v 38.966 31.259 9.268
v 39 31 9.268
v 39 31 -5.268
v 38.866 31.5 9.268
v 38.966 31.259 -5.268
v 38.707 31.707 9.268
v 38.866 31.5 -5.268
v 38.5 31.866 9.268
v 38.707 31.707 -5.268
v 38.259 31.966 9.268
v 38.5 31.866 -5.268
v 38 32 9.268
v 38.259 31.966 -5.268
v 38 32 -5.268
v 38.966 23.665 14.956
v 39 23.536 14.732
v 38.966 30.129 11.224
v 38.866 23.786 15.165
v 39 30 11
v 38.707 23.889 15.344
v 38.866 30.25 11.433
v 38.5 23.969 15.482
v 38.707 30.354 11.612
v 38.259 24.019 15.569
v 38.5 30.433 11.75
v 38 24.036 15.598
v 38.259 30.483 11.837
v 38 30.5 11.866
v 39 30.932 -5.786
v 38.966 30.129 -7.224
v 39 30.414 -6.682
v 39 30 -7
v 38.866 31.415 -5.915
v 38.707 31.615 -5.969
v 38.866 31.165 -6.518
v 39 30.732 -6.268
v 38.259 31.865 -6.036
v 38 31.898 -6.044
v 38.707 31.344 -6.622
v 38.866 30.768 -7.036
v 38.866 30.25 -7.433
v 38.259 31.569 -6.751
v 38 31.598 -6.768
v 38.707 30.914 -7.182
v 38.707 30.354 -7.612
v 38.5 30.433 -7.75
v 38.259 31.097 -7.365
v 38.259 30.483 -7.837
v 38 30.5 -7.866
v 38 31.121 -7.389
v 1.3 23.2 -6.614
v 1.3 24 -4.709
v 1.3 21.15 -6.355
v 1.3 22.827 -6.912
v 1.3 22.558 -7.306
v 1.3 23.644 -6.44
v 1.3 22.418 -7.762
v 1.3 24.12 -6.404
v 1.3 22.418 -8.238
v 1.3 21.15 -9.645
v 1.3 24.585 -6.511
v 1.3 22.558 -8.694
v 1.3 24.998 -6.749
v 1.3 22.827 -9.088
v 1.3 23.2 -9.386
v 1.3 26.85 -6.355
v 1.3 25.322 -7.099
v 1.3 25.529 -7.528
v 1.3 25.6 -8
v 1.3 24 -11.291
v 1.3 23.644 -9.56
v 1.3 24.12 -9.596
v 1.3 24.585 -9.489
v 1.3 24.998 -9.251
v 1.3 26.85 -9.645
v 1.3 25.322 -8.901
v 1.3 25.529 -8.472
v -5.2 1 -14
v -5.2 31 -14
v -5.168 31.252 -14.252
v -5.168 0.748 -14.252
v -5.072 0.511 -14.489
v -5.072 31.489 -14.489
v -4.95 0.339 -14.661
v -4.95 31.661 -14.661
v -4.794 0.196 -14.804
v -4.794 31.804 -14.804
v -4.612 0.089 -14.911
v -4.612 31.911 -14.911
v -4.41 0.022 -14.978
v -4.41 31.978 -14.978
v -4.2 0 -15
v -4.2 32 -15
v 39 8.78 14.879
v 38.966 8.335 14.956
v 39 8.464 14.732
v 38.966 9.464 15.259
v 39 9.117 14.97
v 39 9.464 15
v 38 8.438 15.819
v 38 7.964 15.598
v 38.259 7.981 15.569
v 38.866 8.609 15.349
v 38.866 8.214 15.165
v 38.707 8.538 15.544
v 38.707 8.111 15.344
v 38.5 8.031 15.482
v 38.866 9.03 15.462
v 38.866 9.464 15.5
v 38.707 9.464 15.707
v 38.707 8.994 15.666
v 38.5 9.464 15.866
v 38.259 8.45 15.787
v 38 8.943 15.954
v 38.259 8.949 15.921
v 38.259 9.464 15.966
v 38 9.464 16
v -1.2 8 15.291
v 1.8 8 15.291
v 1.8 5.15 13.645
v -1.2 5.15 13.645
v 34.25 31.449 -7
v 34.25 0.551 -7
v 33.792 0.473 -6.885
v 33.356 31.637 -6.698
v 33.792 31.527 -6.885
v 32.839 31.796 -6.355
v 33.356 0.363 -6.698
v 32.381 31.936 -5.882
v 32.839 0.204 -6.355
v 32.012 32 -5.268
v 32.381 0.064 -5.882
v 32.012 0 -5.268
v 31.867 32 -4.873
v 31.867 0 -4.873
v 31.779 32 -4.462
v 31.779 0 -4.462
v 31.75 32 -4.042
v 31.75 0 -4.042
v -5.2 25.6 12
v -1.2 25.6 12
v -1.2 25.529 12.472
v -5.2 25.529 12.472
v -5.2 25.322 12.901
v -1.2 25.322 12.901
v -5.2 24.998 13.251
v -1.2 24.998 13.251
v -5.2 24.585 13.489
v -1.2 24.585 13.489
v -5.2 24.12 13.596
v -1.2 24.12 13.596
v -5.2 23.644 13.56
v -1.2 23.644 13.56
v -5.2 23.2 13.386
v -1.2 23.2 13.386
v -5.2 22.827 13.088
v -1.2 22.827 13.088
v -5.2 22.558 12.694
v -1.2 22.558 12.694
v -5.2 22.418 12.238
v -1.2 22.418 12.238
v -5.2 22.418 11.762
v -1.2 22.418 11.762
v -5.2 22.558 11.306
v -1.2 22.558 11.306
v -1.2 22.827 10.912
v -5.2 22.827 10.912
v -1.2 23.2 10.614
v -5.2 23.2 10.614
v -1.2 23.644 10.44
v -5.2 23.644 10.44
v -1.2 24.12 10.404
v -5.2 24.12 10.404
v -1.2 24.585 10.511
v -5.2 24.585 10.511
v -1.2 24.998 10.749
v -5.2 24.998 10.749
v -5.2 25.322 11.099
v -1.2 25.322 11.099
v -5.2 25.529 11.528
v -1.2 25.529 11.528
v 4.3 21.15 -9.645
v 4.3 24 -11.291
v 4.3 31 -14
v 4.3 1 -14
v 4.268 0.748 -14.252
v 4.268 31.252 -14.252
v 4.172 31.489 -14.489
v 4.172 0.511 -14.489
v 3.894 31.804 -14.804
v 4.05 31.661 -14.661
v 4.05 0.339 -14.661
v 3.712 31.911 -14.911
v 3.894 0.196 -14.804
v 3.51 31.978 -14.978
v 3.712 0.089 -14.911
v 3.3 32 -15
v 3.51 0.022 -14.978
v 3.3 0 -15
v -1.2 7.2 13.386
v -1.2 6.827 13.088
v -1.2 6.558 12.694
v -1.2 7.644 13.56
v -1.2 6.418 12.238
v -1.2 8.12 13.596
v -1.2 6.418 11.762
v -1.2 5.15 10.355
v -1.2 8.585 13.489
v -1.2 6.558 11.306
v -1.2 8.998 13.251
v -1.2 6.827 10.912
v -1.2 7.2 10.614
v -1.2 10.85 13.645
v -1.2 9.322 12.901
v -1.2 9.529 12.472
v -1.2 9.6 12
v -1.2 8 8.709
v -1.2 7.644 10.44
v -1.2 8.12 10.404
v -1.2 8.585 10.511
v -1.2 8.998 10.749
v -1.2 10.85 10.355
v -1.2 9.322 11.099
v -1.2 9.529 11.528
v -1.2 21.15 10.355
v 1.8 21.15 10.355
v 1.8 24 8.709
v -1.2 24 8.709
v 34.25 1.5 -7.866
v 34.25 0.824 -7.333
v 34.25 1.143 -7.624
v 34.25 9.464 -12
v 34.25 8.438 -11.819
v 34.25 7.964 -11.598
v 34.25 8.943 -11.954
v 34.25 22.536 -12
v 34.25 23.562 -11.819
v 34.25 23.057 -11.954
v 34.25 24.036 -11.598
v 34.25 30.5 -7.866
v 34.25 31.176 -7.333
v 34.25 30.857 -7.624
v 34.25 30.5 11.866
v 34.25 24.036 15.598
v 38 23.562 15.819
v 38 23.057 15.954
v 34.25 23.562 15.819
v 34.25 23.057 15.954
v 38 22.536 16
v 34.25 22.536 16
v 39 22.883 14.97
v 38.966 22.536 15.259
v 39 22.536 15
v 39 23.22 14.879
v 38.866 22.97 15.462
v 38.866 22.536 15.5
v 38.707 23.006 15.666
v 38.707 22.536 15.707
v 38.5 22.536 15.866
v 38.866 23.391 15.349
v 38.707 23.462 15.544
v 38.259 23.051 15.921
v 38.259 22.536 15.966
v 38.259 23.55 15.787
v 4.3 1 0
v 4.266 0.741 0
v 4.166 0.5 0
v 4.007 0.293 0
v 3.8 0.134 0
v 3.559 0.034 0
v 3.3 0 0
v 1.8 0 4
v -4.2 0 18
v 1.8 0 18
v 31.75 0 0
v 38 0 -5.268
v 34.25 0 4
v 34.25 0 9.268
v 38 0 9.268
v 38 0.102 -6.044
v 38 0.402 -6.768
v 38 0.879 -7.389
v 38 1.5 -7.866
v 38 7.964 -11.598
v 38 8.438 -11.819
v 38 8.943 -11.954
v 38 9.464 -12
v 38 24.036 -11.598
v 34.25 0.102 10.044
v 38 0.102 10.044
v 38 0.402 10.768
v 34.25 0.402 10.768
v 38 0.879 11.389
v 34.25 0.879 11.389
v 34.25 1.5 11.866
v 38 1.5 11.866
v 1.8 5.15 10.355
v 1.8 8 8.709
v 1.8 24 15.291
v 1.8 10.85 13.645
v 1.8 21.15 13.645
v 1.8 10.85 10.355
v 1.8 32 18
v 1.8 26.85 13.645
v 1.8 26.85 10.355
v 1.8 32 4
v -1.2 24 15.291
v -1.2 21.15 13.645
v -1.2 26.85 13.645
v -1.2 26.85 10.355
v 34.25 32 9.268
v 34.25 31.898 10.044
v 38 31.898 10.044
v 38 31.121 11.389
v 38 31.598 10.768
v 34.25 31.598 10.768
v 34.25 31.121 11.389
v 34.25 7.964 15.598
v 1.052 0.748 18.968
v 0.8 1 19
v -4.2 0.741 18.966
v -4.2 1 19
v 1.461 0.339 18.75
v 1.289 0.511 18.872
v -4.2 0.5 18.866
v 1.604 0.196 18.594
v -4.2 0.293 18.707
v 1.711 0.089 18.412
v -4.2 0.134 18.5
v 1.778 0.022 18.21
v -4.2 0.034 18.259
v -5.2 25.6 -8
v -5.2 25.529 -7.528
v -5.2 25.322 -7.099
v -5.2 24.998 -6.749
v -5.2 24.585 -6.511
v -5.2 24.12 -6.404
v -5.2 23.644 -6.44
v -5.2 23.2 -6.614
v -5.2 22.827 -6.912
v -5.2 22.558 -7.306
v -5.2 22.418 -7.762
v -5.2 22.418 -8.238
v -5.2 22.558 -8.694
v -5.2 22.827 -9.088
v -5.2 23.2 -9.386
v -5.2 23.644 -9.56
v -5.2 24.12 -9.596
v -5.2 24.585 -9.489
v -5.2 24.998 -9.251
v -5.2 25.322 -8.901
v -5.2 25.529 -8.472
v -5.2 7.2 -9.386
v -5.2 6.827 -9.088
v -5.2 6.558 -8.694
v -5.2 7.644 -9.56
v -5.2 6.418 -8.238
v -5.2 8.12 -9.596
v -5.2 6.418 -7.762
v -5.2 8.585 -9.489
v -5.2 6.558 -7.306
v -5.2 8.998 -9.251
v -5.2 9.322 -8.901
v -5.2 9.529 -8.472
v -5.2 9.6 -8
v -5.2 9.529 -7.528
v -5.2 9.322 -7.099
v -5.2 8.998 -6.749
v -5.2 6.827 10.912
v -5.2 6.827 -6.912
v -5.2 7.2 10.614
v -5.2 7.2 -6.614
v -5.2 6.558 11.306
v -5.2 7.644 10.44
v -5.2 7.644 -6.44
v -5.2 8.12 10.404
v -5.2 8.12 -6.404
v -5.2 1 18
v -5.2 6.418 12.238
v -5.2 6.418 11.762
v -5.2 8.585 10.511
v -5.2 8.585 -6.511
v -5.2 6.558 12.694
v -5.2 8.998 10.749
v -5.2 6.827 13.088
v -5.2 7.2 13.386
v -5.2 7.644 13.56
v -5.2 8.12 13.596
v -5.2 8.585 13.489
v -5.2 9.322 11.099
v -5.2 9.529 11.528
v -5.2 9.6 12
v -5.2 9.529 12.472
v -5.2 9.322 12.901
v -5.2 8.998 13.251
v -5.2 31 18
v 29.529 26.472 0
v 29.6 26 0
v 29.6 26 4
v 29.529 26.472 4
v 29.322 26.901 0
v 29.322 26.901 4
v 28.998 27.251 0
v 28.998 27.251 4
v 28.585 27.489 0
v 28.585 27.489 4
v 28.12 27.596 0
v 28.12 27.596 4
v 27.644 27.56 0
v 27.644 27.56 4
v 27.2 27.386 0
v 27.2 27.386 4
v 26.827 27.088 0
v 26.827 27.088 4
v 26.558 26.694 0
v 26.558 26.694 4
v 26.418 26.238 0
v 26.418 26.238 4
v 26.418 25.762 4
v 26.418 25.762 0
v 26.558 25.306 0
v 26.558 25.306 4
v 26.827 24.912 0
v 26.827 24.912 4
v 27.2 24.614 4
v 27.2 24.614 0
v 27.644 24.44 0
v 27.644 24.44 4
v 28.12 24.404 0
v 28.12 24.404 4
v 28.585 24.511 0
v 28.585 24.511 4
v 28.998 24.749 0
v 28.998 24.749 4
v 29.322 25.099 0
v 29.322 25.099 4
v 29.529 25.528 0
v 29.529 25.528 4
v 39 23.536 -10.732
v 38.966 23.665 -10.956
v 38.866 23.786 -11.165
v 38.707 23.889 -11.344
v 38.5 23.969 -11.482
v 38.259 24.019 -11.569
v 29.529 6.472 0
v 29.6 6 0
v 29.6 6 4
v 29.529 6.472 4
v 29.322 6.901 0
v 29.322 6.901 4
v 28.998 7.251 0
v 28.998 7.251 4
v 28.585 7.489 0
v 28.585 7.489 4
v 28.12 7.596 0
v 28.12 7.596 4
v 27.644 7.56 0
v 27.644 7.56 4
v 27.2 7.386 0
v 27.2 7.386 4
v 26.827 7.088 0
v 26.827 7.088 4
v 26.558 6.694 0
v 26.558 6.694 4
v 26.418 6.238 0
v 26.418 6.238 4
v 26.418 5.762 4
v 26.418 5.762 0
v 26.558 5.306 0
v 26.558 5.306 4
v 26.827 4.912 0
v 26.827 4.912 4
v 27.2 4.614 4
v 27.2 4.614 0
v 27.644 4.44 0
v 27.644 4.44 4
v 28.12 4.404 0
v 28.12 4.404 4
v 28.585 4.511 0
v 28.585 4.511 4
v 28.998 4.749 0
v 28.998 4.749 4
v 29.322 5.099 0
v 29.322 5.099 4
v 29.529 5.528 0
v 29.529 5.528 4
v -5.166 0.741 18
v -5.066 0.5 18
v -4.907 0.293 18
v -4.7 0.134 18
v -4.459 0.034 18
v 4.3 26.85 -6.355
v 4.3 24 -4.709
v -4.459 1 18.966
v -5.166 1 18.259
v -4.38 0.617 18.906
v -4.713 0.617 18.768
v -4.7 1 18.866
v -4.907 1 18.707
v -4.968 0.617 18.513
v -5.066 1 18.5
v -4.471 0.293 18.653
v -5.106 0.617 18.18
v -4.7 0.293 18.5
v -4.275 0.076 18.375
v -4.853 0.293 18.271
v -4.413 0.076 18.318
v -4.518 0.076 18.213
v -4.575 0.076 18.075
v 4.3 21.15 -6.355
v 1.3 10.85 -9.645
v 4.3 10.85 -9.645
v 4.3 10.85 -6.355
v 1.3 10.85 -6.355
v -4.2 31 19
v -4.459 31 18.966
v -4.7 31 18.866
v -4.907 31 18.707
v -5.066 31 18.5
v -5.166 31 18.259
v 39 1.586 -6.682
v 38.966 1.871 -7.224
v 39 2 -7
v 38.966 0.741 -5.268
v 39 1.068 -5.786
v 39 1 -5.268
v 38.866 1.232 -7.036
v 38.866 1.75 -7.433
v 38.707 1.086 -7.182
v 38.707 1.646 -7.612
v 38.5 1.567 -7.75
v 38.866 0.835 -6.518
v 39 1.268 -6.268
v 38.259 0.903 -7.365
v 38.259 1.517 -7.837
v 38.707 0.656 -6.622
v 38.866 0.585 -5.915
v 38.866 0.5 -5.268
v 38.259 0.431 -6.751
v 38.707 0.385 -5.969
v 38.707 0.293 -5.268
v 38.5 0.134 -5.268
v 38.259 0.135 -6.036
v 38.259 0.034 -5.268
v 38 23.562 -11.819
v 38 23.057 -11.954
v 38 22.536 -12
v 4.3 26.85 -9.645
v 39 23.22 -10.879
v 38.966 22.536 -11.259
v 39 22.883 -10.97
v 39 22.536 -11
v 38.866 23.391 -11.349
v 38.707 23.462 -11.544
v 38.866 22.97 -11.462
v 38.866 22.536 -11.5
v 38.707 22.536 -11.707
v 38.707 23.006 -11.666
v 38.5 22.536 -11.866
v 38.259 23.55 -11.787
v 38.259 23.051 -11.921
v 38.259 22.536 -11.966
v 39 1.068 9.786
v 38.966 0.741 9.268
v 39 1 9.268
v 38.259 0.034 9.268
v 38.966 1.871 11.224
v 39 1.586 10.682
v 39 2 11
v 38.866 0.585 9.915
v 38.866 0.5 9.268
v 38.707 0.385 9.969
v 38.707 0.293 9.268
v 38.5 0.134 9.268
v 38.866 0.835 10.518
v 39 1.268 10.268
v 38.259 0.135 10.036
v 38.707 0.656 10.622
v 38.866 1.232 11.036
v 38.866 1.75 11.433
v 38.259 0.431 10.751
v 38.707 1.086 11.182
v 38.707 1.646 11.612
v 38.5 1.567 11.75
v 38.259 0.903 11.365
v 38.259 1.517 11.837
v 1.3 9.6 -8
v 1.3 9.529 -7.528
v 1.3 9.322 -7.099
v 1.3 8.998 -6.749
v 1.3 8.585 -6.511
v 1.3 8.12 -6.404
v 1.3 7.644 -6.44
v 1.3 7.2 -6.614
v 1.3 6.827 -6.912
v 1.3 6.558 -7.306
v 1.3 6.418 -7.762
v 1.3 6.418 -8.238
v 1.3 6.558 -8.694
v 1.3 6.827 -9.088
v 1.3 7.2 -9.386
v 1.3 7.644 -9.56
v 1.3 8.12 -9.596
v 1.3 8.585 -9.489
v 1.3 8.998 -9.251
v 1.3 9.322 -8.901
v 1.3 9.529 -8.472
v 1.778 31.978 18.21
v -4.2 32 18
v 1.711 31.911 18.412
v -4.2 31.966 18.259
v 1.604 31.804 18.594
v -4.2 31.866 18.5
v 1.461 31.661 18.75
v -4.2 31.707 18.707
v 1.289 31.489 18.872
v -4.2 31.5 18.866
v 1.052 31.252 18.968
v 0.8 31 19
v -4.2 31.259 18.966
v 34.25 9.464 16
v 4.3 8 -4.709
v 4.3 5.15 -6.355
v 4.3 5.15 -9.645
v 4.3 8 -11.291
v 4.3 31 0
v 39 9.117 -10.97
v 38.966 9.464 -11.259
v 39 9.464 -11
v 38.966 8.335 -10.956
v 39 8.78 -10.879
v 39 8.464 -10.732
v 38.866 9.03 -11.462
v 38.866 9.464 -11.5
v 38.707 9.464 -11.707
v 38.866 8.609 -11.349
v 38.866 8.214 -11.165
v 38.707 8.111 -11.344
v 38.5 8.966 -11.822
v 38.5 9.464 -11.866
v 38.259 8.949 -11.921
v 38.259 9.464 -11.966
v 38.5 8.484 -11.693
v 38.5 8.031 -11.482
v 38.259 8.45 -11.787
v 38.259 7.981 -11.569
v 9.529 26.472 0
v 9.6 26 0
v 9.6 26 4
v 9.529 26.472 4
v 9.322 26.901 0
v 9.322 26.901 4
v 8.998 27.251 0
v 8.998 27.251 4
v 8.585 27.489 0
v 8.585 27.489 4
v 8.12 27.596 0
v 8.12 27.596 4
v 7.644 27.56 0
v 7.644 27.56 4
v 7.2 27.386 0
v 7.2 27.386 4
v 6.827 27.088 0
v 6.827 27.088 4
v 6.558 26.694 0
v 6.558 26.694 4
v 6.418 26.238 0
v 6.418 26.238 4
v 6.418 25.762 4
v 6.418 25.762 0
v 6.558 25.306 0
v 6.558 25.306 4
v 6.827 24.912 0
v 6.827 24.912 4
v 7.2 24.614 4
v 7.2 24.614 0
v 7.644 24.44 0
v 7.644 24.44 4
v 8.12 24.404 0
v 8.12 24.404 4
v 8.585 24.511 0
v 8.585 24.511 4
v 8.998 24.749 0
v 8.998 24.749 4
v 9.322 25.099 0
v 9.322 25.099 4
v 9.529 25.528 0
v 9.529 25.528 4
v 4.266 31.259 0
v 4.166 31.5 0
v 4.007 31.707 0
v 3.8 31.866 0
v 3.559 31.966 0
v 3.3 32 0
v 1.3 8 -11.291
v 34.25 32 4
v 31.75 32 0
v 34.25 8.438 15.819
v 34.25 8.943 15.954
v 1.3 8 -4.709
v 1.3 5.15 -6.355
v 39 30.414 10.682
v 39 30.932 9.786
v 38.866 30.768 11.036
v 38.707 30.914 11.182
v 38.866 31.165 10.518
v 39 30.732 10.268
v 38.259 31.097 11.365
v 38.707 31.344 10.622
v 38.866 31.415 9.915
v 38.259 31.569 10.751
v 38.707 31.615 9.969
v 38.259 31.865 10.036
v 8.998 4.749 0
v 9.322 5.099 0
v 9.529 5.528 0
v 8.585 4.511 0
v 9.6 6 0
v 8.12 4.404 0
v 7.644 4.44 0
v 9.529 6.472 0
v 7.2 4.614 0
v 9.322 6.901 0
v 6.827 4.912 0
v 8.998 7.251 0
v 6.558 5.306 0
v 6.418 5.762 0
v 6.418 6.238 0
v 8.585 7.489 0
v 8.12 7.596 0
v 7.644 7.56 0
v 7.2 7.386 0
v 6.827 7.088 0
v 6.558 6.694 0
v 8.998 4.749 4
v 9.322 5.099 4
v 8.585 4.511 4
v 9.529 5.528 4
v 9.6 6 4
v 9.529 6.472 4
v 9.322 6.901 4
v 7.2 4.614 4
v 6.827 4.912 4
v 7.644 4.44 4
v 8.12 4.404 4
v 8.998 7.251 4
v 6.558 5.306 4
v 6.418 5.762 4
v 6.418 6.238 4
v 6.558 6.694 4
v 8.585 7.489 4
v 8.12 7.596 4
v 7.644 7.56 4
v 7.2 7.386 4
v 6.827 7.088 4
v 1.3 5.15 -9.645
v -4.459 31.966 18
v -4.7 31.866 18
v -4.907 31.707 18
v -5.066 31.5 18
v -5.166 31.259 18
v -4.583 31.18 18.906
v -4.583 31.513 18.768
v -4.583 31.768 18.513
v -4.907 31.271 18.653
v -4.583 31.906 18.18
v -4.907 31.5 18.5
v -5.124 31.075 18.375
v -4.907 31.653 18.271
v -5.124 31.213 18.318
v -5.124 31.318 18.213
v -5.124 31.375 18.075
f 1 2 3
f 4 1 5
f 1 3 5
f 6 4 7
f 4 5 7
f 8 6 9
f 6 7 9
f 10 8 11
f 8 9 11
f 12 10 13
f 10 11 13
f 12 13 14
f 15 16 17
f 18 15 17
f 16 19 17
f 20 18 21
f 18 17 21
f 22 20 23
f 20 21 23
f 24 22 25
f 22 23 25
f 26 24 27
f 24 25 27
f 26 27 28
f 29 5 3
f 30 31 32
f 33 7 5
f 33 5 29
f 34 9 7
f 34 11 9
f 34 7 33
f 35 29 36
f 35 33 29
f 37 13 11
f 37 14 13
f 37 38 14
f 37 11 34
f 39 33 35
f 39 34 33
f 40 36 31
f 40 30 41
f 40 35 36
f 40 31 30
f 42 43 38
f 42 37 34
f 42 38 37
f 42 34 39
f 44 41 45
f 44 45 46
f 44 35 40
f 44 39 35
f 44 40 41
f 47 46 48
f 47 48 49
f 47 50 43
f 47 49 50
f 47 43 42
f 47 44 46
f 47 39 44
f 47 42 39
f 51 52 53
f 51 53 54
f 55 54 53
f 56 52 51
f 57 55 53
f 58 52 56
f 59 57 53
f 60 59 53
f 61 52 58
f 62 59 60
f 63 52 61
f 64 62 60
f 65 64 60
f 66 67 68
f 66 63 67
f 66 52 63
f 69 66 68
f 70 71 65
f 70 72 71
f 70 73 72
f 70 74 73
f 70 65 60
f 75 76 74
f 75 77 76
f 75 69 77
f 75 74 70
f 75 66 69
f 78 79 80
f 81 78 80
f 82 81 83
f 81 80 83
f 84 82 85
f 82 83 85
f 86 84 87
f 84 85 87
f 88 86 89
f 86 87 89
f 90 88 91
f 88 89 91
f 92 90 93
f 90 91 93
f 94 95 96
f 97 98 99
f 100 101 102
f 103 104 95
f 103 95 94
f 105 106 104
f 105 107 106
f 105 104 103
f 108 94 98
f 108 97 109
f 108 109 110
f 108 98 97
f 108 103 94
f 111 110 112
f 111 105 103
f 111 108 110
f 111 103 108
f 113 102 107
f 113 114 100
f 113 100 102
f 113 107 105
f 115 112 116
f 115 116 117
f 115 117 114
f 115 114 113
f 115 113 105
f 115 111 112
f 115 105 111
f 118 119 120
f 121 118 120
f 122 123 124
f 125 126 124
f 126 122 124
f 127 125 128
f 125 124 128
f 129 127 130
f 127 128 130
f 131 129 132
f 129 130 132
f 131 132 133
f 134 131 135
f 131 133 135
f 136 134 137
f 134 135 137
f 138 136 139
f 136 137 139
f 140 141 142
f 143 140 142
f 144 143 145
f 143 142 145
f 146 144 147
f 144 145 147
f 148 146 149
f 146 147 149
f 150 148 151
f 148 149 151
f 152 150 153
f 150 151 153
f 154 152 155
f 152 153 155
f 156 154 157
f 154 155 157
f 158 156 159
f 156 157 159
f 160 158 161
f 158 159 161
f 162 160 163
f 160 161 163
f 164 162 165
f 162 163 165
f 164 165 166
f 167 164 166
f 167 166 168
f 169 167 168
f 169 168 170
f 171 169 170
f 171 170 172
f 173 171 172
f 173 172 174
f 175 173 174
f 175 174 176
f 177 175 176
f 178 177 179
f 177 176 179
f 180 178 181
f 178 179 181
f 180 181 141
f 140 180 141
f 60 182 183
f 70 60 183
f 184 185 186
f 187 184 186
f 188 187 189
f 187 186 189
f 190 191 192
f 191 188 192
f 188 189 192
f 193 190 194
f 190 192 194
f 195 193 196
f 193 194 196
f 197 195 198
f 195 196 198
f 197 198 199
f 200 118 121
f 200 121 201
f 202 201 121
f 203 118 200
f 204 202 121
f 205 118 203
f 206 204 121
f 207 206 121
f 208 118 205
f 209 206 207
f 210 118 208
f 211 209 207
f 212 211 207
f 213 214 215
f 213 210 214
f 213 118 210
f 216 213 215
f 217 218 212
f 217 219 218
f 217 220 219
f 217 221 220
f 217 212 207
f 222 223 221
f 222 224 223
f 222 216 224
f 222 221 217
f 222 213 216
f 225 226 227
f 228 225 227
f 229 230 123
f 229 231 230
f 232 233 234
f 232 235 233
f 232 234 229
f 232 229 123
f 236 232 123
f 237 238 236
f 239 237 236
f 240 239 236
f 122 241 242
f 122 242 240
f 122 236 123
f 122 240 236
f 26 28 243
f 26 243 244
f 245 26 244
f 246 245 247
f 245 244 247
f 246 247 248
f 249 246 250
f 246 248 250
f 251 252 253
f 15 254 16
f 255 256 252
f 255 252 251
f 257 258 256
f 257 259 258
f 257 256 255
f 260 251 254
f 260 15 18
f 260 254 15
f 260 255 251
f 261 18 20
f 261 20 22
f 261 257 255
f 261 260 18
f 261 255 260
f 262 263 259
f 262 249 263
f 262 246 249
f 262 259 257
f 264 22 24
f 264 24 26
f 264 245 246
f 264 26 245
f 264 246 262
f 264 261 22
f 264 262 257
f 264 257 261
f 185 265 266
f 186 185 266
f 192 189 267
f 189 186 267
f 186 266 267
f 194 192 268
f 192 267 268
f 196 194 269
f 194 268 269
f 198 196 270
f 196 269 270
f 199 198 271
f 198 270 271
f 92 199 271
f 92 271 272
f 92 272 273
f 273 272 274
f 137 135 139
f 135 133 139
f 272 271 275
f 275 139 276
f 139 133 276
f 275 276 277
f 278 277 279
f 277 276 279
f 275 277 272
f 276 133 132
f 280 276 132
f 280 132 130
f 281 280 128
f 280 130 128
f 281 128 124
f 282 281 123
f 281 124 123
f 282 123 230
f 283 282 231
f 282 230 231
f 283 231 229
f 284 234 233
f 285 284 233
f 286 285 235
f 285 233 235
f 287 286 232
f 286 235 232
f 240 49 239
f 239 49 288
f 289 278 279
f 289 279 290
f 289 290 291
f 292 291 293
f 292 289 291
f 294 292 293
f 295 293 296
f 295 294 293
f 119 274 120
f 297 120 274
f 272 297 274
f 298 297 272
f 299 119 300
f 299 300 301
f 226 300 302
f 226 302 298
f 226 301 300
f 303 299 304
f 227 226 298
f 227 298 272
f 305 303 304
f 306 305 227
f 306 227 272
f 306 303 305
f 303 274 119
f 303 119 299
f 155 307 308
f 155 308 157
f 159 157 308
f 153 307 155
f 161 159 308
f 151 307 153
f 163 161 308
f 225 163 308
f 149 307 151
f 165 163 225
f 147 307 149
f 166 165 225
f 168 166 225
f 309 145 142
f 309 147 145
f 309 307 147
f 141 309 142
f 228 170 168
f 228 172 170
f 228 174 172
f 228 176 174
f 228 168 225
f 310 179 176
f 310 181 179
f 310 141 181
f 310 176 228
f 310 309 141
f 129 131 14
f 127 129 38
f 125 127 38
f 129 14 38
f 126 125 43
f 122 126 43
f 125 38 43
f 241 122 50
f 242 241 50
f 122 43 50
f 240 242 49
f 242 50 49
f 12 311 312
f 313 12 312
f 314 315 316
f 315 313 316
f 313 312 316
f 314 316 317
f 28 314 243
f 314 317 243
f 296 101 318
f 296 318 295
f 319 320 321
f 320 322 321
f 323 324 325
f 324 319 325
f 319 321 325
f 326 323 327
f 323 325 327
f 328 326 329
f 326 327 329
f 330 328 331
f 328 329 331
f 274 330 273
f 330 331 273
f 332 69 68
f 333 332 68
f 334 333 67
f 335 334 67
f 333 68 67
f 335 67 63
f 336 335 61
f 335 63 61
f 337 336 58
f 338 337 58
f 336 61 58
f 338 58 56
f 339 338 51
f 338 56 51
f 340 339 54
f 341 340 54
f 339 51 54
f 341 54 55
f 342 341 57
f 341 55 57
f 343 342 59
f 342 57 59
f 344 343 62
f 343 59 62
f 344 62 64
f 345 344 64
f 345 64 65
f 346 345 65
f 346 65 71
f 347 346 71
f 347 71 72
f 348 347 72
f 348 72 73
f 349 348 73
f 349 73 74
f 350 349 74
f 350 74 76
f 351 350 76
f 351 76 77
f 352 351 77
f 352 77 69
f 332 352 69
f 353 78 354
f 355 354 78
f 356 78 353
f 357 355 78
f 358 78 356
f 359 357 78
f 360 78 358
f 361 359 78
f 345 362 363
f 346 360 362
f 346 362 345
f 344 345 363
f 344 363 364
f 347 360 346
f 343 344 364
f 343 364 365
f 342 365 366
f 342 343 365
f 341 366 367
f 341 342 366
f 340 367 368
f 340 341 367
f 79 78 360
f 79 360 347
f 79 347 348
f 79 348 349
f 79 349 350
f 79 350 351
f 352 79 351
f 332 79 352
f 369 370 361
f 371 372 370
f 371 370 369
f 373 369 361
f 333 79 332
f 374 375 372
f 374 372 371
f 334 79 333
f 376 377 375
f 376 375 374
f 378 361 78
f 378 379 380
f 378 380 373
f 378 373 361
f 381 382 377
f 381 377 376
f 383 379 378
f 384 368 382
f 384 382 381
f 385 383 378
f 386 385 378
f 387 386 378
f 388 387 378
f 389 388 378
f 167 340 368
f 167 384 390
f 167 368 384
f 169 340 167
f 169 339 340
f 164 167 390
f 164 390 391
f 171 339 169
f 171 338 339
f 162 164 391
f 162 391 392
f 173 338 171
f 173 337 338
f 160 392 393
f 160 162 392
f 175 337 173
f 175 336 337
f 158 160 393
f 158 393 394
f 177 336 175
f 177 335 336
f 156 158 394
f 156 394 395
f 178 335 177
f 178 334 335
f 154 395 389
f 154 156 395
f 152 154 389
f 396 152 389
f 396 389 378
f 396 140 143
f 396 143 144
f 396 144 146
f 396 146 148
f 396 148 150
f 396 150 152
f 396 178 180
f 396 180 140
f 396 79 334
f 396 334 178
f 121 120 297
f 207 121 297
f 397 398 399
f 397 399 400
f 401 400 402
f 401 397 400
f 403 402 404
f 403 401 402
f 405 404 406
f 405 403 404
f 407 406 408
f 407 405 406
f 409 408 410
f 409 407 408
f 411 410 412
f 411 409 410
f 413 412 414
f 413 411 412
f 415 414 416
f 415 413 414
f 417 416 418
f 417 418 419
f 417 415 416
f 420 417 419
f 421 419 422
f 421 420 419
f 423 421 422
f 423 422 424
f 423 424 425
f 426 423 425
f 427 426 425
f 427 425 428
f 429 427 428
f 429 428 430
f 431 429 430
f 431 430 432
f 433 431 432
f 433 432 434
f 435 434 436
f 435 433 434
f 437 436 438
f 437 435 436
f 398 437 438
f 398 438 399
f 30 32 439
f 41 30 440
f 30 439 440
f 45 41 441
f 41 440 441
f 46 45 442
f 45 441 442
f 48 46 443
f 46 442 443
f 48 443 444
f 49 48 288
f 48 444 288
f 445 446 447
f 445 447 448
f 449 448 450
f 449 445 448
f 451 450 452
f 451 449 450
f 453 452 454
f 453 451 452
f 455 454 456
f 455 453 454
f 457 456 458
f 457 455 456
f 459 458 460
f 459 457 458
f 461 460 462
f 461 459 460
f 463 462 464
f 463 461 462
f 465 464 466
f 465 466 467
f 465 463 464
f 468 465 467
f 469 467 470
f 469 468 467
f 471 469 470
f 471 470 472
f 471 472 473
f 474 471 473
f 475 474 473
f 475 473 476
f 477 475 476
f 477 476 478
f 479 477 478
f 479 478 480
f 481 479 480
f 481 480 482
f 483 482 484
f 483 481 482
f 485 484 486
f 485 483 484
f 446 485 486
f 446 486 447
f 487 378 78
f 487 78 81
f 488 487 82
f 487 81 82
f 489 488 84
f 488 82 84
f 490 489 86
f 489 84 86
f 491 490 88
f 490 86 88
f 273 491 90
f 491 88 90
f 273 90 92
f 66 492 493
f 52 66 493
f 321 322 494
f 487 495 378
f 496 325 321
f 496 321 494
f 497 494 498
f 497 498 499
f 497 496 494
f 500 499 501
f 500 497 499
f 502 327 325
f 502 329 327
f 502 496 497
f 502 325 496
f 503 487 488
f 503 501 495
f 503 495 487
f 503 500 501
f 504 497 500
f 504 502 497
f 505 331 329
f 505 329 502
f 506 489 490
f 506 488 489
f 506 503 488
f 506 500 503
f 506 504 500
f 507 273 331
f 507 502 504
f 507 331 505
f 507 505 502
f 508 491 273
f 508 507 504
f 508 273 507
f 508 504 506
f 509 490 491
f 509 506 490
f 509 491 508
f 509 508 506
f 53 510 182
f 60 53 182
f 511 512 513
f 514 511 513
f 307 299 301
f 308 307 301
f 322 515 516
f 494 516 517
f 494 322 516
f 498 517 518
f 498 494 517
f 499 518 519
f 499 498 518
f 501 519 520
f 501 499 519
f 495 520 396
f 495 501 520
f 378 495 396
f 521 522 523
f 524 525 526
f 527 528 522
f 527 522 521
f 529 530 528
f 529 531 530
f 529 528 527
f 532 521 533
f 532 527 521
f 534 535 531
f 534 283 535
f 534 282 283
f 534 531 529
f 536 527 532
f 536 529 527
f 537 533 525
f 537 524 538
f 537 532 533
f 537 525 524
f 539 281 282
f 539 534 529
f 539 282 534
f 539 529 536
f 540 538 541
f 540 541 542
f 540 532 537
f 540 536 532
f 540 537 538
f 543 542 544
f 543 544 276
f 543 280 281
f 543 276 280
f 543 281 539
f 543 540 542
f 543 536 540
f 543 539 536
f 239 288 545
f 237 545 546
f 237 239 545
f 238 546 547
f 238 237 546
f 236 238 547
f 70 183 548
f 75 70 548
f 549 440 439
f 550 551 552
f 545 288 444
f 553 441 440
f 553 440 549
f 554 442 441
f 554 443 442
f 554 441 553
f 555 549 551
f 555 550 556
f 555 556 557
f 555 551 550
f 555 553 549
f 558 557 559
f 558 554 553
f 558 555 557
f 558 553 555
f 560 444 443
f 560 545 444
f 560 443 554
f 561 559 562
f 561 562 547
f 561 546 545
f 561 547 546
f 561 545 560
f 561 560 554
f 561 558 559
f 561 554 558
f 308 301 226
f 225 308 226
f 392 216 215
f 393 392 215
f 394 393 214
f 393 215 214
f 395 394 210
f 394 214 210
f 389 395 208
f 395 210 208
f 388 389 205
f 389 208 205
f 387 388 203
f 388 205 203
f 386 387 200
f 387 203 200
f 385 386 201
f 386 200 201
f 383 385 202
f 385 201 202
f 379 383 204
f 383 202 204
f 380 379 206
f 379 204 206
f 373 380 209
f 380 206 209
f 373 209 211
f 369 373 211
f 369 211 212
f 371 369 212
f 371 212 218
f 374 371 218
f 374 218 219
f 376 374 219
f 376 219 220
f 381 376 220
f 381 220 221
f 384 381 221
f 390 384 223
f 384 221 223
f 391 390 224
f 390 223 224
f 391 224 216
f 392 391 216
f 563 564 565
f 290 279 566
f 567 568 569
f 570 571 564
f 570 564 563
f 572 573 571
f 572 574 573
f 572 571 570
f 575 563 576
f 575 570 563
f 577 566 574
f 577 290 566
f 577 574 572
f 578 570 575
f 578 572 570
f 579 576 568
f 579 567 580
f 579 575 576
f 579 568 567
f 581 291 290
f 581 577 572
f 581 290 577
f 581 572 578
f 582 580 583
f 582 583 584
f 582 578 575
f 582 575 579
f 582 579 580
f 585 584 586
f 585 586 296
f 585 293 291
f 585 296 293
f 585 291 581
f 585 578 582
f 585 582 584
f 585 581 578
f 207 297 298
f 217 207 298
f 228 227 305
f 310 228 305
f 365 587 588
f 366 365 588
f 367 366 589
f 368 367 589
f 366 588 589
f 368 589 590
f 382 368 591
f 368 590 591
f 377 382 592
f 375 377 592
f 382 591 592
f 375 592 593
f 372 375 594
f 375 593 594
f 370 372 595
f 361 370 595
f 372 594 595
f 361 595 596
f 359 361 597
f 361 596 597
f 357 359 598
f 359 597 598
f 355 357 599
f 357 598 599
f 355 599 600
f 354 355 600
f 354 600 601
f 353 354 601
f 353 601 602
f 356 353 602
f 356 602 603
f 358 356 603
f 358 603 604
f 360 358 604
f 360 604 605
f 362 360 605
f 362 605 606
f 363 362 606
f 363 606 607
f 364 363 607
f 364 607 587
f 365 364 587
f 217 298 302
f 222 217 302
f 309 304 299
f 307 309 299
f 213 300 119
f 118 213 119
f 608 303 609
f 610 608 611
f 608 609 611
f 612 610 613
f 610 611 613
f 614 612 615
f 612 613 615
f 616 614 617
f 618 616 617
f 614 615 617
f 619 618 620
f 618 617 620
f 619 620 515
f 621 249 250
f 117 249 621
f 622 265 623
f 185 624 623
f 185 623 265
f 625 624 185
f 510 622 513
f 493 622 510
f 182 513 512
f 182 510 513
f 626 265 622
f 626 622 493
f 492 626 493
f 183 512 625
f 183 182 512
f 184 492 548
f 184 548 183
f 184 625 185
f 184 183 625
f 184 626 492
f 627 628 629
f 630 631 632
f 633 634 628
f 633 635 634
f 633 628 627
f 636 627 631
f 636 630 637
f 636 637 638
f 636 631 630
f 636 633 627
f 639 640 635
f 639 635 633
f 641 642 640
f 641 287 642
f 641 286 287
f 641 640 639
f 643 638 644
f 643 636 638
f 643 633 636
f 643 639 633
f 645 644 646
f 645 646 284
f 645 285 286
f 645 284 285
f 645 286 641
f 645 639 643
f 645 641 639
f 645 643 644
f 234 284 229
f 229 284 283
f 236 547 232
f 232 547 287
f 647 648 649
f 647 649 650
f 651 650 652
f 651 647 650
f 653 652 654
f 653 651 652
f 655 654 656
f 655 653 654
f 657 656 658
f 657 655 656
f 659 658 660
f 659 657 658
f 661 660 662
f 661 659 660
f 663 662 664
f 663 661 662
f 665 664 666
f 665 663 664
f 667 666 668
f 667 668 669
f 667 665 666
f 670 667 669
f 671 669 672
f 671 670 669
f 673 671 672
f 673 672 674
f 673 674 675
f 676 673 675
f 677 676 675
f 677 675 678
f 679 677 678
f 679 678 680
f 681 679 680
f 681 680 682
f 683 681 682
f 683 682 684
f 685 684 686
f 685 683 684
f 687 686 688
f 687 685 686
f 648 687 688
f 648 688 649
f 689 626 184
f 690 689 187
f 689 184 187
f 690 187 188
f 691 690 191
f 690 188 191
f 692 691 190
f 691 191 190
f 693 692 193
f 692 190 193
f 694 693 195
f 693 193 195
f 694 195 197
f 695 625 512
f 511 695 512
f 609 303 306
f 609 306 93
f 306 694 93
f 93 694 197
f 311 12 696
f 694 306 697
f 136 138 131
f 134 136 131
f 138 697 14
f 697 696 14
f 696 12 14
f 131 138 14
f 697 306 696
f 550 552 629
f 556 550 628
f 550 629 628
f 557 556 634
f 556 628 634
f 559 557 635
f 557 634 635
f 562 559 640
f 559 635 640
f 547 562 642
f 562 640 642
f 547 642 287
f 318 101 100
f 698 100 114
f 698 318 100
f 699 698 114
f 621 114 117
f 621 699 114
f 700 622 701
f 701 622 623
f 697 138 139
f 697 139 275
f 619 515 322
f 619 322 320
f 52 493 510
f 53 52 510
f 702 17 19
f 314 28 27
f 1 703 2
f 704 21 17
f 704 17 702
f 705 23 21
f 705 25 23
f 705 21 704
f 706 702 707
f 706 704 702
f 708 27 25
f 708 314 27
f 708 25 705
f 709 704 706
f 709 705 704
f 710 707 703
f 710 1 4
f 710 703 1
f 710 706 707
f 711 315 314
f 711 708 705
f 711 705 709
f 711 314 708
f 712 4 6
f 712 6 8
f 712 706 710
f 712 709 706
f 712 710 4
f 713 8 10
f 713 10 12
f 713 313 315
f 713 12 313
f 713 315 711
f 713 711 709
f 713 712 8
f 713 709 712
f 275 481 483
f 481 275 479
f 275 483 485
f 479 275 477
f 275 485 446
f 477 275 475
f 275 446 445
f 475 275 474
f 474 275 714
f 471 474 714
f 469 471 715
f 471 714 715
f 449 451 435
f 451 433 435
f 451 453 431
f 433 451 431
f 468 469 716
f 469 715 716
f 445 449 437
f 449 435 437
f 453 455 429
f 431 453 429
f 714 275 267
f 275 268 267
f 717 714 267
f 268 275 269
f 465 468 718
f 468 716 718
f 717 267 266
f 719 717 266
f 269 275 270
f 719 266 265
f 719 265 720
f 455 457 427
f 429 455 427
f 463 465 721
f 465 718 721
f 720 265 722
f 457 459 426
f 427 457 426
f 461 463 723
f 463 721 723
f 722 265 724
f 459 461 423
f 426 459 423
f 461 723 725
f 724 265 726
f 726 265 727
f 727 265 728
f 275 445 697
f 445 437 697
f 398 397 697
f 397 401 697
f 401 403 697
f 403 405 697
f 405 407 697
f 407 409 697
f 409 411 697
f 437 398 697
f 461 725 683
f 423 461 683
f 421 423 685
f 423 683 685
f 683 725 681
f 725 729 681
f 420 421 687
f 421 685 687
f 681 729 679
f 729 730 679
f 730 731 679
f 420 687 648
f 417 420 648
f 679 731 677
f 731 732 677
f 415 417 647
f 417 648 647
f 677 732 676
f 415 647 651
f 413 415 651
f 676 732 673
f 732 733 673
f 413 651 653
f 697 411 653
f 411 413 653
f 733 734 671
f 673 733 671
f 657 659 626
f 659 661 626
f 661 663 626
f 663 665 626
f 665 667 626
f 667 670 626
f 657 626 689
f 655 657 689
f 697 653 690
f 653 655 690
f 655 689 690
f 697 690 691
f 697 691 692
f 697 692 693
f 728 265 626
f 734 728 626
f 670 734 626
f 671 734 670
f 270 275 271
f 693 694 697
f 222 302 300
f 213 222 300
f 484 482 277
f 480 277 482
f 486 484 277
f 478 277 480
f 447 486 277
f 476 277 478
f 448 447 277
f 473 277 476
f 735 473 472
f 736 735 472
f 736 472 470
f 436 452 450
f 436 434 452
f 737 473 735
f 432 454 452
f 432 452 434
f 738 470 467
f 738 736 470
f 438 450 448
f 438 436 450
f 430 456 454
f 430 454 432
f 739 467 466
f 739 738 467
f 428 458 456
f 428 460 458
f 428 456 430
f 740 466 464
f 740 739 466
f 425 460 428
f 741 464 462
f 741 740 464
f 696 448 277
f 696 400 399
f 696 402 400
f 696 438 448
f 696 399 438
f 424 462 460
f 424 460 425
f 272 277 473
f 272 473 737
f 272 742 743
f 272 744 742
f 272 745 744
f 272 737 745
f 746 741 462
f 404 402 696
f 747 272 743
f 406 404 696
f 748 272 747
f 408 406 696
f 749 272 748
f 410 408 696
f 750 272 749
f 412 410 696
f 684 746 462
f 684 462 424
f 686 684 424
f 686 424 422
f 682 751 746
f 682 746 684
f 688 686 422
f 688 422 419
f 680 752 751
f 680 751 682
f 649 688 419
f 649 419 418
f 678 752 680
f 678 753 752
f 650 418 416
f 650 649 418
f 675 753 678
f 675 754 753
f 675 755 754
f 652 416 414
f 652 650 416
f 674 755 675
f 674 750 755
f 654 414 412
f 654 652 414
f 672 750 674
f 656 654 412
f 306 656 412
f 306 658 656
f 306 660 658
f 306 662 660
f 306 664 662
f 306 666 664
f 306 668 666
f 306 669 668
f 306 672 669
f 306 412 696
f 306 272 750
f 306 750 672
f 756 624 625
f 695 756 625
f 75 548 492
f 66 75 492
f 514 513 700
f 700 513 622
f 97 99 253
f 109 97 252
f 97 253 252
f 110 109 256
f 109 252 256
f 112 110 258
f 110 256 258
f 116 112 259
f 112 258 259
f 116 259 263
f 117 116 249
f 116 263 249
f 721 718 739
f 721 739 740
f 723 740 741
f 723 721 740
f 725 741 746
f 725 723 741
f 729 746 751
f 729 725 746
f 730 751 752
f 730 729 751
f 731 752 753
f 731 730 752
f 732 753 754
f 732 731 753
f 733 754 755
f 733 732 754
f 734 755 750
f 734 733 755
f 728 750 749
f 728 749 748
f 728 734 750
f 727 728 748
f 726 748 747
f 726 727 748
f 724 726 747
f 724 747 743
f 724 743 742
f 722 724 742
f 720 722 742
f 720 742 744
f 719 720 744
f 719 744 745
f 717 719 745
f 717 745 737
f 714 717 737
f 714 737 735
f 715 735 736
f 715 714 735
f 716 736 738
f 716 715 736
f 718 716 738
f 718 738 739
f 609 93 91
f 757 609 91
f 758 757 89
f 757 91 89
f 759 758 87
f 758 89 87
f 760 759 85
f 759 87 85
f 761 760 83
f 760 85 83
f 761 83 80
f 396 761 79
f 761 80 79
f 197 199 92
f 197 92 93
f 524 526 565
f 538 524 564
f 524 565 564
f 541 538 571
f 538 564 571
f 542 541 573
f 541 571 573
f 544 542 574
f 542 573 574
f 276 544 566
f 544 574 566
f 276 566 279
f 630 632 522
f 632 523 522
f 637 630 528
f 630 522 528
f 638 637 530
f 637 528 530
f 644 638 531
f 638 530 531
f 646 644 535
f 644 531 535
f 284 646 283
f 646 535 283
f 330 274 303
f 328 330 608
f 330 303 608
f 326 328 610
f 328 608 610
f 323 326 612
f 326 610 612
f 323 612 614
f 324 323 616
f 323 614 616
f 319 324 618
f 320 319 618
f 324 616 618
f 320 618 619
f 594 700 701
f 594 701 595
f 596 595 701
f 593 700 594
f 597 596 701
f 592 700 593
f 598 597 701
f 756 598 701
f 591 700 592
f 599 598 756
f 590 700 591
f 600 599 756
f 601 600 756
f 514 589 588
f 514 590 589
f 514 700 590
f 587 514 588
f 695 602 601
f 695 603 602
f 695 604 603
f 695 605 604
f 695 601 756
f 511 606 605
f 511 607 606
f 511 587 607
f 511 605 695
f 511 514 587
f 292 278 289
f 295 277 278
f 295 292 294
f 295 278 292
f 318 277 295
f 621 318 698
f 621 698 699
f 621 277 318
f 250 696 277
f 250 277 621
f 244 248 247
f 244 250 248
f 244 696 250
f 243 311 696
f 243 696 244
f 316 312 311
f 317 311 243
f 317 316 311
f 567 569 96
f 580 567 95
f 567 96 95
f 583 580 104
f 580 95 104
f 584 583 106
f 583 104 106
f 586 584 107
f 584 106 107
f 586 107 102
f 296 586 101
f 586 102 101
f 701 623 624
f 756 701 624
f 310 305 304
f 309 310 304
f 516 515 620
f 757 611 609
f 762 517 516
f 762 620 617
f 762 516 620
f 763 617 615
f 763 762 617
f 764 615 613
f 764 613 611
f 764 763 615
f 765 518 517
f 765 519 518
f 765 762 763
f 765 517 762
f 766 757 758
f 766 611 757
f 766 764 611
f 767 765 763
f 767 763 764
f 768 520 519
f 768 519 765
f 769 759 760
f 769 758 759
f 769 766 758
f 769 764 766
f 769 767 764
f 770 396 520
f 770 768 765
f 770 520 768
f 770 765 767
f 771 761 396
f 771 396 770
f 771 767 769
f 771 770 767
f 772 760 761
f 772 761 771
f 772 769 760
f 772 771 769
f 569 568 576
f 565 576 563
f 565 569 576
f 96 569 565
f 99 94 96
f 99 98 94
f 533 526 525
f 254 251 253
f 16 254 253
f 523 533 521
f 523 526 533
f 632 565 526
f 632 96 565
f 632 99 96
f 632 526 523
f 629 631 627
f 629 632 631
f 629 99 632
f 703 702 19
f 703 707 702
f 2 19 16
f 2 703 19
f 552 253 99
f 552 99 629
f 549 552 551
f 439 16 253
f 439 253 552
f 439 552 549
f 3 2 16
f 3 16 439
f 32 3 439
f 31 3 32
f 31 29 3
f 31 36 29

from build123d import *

# Parameters (mm, degrees)
SKETCH_1_W          = 36
SKETCH_1_H          = 32
SKETCH_1_R          = 1.6
EXTRUDE_1_DEPTH     = 4
EXTRUDE_2_DEPTH     = 32
SKETCH_8_R          = 1.6
CUT_EXTRUDE_1_DEPTH = 53.619768148
SKETCH1_W           = 4
SKETCH1_H           = 32
BOSS_EXTRUDE1_DEPTH = 3
SKETCH2_W           = 5
SKETCH2_H           = 32
BOSS_EXTRUDE2_DEPTH = 12
CUT_EXTRUDE1_DEPTH  = 5
BOSS_EXTRUDE5_DEPTH = 5
BOSS_EXTRUDE6_START = 3
SKETCH7_W           = 15
SKETCH7_H           = 32
SKETCH7_R           = 1.6
BOSS_EXTRUDE6_DEPTH = 3
CUT_EXTRUDE2_DEPTH  = 0.25
BOSS_EXTRUDE7_START = 2.5
SKETCH9_W           = 15
SKETCH9_H           = 32
SKETCH9_R           = 1.6
BOSS_EXTRUDE7_DEPTH = 2.5
BOSS_EXTRUDE8_DEPTH = 2.5
CUT_EXTRUDE3_DEPTH  = 2.5
FILLET2_R           = 3
FILLET4_R           = 3
FILLET5_R           = 3
FILLET9_R           = 1
FILLET11_R          = 1
CUT_EXTRUDE4_DEPTH  = 3
CUT_EXTRUDE5_DEPTH  = 3
FILLET14_R          = 1


with BuildPart() as part:
    # Эскиз1 → Бобышка-Вытянуть1 (new body)
    with BuildSketch(Plane.XY):
        with Locations((18, 16)):
            Rectangle(SKETCH_1_W, SKETCH_1_H)
        with Locations((8, 26)):
            Circle(SKETCH_1_R, mode=Mode.SUBTRACT)
        with Locations((28, 26)):
            Circle(SKETCH_1_R, mode=Mode.SUBTRACT)
        with Locations((8, 6)):
            Circle(SKETCH_1_R, mode=Mode.SUBTRACT)
        with Locations((28, 6)):
            Circle(SKETCH_1_R, mode=Mode.SUBTRACT)
    extrude(amount=EXTRUDE_1_DEPTH)

    # Эскиз7 → Бобышка-Вытянуть2 (add)
    with BuildSketch(Plane(origin=(0, 32, 0), x_dir=(1, 0, 0), z_dir=(0, 1, 0))):
        Polygon((0, 0), (-1.2, 0), (-1.2, 15), (-5.2, 15), (-5.2, -19), (-1.2, -19), (-1.2, -4), (0, -4), align=None)
    extrude(amount=-EXTRUDE_2_DEPTH)

    # Эскиз8 → Вырез-Вытянуть1 (cut, through all)
    with BuildSketch(Plane(origin=(-1.2, 0, 0), x_dir=(0, 0, -1), z_dir=(1, 0, 0))):
        with Locations(Location((8, 24, 0), (0, 0, 90))):
            Circle(SKETCH_8_R)
        with Locations(Location((8, 8, 0), (0, 0, 90))):
            Circle(SKETCH_8_R)
        with Locations(Location((-12, 8, 0), (0, 0, 90))):
            Circle(SKETCH_8_R)
        with Locations(Location((-12, 24, 0), (0, 0, 90))):
            Circle(SKETCH_8_R)
    extrude(amount=-CUT_EXTRUDE_1_DEPTH, mode=Mode.SUBTRACT)

    # Sketch1 → Boss-Extrude1 (add)
    with BuildSketch(Plane(origin=(36, 0, 0), x_dir=(0, 0, -1), z_dir=(1, 0, 0))):
        with Locations((-2, 16)):
            Rectangle(SKETCH1_W, SKETCH1_H)
    extrude(amount=BOSS_EXTRUDE1_DEPTH)

    # Sketch2 → Boss-Extrude2 (add)
    with BuildSketch(Plane(origin=(0, 0, 0), x_dir=(-1, 0, 0), z_dir=(0, 0, -1))):
        with Locations((-36.5, 16)):
            Rectangle(SKETCH2_W, SKETCH2_H)
    extrude(amount=BOSS_EXTRUDE2_DEPTH)

    # Sketch3 → Cut-Extrude1 (cut)
    with BuildSketch(Plane(origin=(39, 0, 0), x_dir=(0, 0, -1), z_dir=(1, 0, 0))):
        Polygon((7, 32), (12, 32), (12, 23.339745962), align=None)
        Polygon((12, 8.660254038), (7, 0), (12, 0), align=None)
    extrude(amount=-CUT_EXTRUDE1_DEPTH, mode=Mode.SUBTRACT)

    # Sketch6 → Boss-Extrude5 (add)
    with BuildSketch(Plane(origin=(39, 0, 0), x_dir=(0, 0, -1), z_dir=(1, 0, 0))):
        Polygon((-16, 8.660254038), (-11, 0), (-4, 0), (-4, 32), (-11, 32), (-16, 23.339745962), align=None)
    extrude(amount=-BOSS_EXTRUDE5_DEPTH)

    # Sketch7 → Boss-Extrude6 (add)
    # profile 1 of 2: a face of its own
    with BuildSketch(Plane(origin=(-1.2, 0, 0), x_dir=(0, 0, -1), z_dir=(1, 0, 0)).offset(BOSS_EXTRUDE6_START)):
        with Locations((7.5, 16)):
            Rectangle(SKETCH7_W, SKETCH7_H)
        with Locations(Location((8, 24, 0), (0, 0, 90))):
            Circle(SKETCH7_R, mode=Mode.SUBTRACT)
        with Locations(Location((8, 8, 0), (0, 0, 90))):
            Circle(SKETCH7_R, mode=Mode.SUBTRACT)
    # profile 2 of 2: a face of its own
    with BuildSketch(Plane(origin=(-1.2, 0, 0), x_dir=(0, 0, -1), z_dir=(1, 0, 0)).offset(BOSS_EXTRUDE6_START)):
        with Locations((-11.5, 16)):
            Rectangle(SKETCH7_W, SKETCH7_H)
        with Locations(Location((-12, 24, 0), (0, 0, 90))):
            Circle(SKETCH7_R, mode=Mode.SUBTRACT)
        with Locations(Location((-12, 8, 0), (0, 0, 90))):
            Circle(SKETCH7_R, mode=Mode.SUBTRACT)
    extrude(amount=-BOSS_EXTRUDE6_DEPTH)

    # Sketch8 → Cut-Extrude2 (cut)
    with BuildSketch(Plane.ZY.offset(-34)):
        Polygon((-12, 23.339745962), (-12, 8.660254038), (-7, 0), (0, 0), (0, 32), (-7, 32), align=None)
        Polygon((4, 32), (4, 0), (11, 0), (16, 8.660254038), (16, 23.339745962), (11, 32), align=None)
    extrude(amount=-CUT_EXTRUDE2_DEPTH, mode=Mode.SUBTRACT)

    # Sketch9 → Boss-Extrude7 (add)
    with BuildSketch(Plane(origin=(1.8, 0, 0), x_dir=(0, 0, -1), z_dir=(1, 0, 0)).offset(BOSS_EXTRUDE7_START)):
        with Locations((7.5, 16)):
            Rectangle(SKETCH9_W, SKETCH9_H)
        with Locations(Location((8, 24, 0), (0, 0, 90))):
            Circle(SKETCH9_R, mode=Mode.SUBTRACT)
        with Locations(Location((8, 8, 0), (0, 0, 90))):
            Circle(SKETCH9_R, mode=Mode.SUBTRACT)
    extrude(amount=-BOSS_EXTRUDE7_DEPTH)

    # Sketch10 → Boss-Extrude8 (add)
    with BuildSketch(Plane.ZY.offset(-34.25)):
        Polygon((-7, 32), (-12, 23.339745962), (-12, 8.660254038), (-7, 0), (0, 0), (0, 32), align=None)
    extrude(amount=BOSS_EXTRUDE8_DEPTH)

    # Sketch11 → Cut-Extrude3 (cut)
    with BuildSketch(Plane.ZY.offset(-31.75)):
        Polygon((-7, 32), (-12, 23.339745962), (-12, 8.660254038), (-7, 0), align=None)
    extrude(amount=-CUT_EXTRUDE3_DEPTH, mode=Mode.SUBTRACT)

    # Fillet2
    # the kernel refuses this fillet: 3 mm, written as the material it takes off along each edge
    with BuildSketch(Plane(origin=(31.75, -7.395099729, -7), x_dir=(1, 0, 0), z_dir=(0, 1, 0))) as fillet2_piece_1:
        with BuildLine():
            CenterArc((3, -2.958039892), FILLET2_R, 99.594068227, 80.405931773)
            Line((0, -2.958039892), (-0.06, -2.958039892))
            Line((-0.06, -2.958039892), (-0.06, 0))
            Line((-0.06, 0), (0, 0.06))
            ThreePointArc((0, 0.06), (1.25, 0.06), (2.49, 0.059160798))
            Line((2.49, 0.059160798), (2.5, 0))
        make_face()
    extrude(amount=46.790199458, mode=Mode.SUBTRACT)

    # Fillet4
    fillet4_edges = [part.edges().sort_by_distance(p)[0] for p in [
        (36.625, 32, -7),
        (36.625, 0, -7),
        (36.625, 8.660254038, -12),
        (36.625, 23.339745962, -12),
    ]]
    fillet(fillet4_edges, radius=FILLET4_R)

    # Fillet5
    fillet5_edges = [part.edges().sort_by_distance(p)[0] for p in [
        (36.625, 32, 11),
        (36.625, 23.339745962, 16),
        (36.625, 8.660254038, 16),
        (36.625, 0, 11),
    ]]
    fillet(fillet5_edges, radius=FILLET5_R)

    # Fillet9
    fillet9_edges = [part.edges().sort_by_distance(p)[0] for p in [
        (39, 4.732050808, -9.732050808),
        (39, 16, -12),
        (39, 27.267949192, -9.732050808),
        (39, 32, 2),
        (39, 31.598076211, -6.767949192),
        (39, 23.31235552, -11.897777479),
        (39, 8.68764448, -11.897777479),
        (39, 0.401923789, -6.767949192),
        (39, 4.732050808, 13.732050808),
        (39, 0, 2),
        (39, 27.267949192, 13.732050808),
        (39, 16, 16),
        (39, 31.598076211, 10.767949192),
        (39, 23.31235552, 15.897777479),
        (39, 8.68764448, 15.897777479),
        (39, 0.401923789, 10.767949192),
    ]]
    fillet(fillet9_edges, radius=FILLET9_R)

    # Fillet11
    fillet11_edges = [part.edges().sort_by_distance(p)[0] for p in [
        (1.8, 16, 19),
        (-5.2, 16, 19),
        (-1.7, 32, 19),
        (-1.7, 0, 19),
    ]]
    fillet(fillet11_edges, radius=FILLET11_R)

    # Sketch12 → Cut-Extrude4 (cut)
    with BuildSketch(Plane(origin=(4.3, 0, 0), x_dir=(0, 0, -1), z_dir=(1, 0, 0))):
        Polygon((6.354551733, 26.85), (4.709103466, 24), (6.354551733, 21.15), (9.645448267, 21.15), (11.290896534, 24), (9.645448267, 26.85), align=None)
        Polygon((6.354551733, 10.85), (4.709103466, 8), (6.354551733, 5.15), (9.645448267, 5.15), (11.290896534, 8), (9.645448267, 10.85), align=None)
    extrude(amount=-CUT_EXTRUDE4_DEPTH, mode=Mode.SUBTRACT)

    # Sketch13 → Cut-Extrude5 (cut)
    with BuildSketch(Plane(origin=(1.8, 0, 0), x_dir=(0, 0, -1), z_dir=(1, 0, 0))):
        Polygon((-15.290896534, 24), (-13.645448267, 21.15), (-10.354551733, 21.15), (-8.709103466, 24), (-10.354551733, 26.85), (-13.645448267, 26.85), align=None)
        Polygon((-15.290896534, 8), (-13.645448267, 5.15), (-10.354551733, 5.15), (-8.709103466, 8), (-10.354551733, 10.85), (-13.645448267, 10.85), align=None)
    extrude(amount=-CUT_EXTRUDE5_DEPTH, mode=Mode.SUBTRACT)

    # Fillet14
    # the kernel refuses this fillet: 1 mm, written as the material it takes off along each edge
    with BuildSketch(Plane(origin=(-4.2, 1, 18), x_dir=(-1, 0, 0), z_dir=(0, -1, 0))) as fillet14_piece_1_section:
        Polygon((0, 0), (FILLET14_R, 0), (FILLET14_R, -FILLET14_R), (0, -FILLET14_R), align=None)
    fillet14_piece_1 = extrude(amount=FILLET14_R, mode=Mode.PRIVATE)
    fillet14_piece_1 = fillet14_piece_1 - Plane(origin=(-4.2, 1, 18), x_dir=(0.7071067811865475, 0, -0.7071067811865475), z_dir=(0, -1, 0)) * Sphere(FILLET14_R, mode=Mode.PRIVATE)
    add(fillet14_piece_1, mode=Mode.SUBTRACT)
    with BuildSketch(Plane(origin=(-4.2, 31, 18), x_dir=(0, 1, 0), z_dir=(-1, 0, 0))) as fillet14_piece_2_section:
        Polygon((0, 0), (FILLET14_R, 0), (FILLET14_R, -FILLET14_R), (0, -FILLET14_R), align=None)
    fillet14_piece_2 = extrude(amount=FILLET14_R, mode=Mode.PRIVATE)
    fillet14_piece_2 = fillet14_piece_2 - Plane(origin=(-4.2, 31, 18), x_dir=(0, -0.7071067811865475, -0.7071067811865475), z_dir=(-1, 0, 0)) * Sphere(FILLET14_R, mode=Mode.PRIVATE)
    add(fillet14_piece_2, mode=Mode.SUBTRACT)
    with BuildSketch(Plane(origin=(4.3, 32, -17.5), x_dir=(0, -1, 0), z_dir=(0, 0, 1))) as fillet14_piece_3:
        with BuildLine():
            CenterArc((FILLET14_R, -FILLET14_R), FILLET14_R, 90, 90)
            Line((0, -FILLET14_R), (0, 0))
            Line((0, 0), (FILLET14_R, 0))
        make_face()
    extrude(amount=17.5, mode=Mode.SUBTRACT)
    with BuildSketch(Plane(origin=(4.3, 0, 0), x_dir=(-1, 0, 0), z_dir=(0, 0, -1))) as fillet14_piece_4:
        with BuildLine():
            CenterArc((FILLET14_R, FILLET14_R), FILLET14_R, 180, 90)
            Line((0, FILLET14_R), (0, 0))
            Line((0, 0), (FILLET14_R, 0))
        make_face()
    extrude(amount=17.5, mode=Mode.SUBTRACT)
    with BuildSketch(Plane(origin=(4.3, -2.5, -15), x_dir=(-1, 0, 0), z_dir=(0, 1, 0))) as fillet14_piece_5:
        with BuildLine():
            CenterArc((FILLET14_R, FILLET14_R), FILLET14_R, 180, 90)
            Line((0, FILLET14_R), (0, 0))
            Line((0, 0), (FILLET14_R, 0))
        make_face()
    extrude(amount=37, mode=Mode.SUBTRACT)
    with BuildSketch(Plane(origin=(-5.2, 34.5, -15), x_dir=(0, 0, 1), z_dir=(0, -1, 0))) as fillet14_piece_6:
        with BuildLine():
            CenterArc((FILLET14_R, -FILLET14_R), FILLET14_R, 90, 90)
            Line((0, -FILLET14_R), (0, 0))
            Line((0, 0), (FILLET14_R, 0))
        make_face()
    extrude(amount=37, mode=Mode.SUBTRACT)
    with BuildSketch(Plane(origin=(-5.2, 32, -17.5), x_dir=(0, -1, 0), z_dir=(0, 0, 1)), Plane(origin=(-5.2, 0, -17.5), x_dir=(1, 0, 0), z_dir=(0, 0, 1))) as fillet14_piece_7:
        with BuildLine():
            CenterArc((FILLET14_R, FILLET14_R), FILLET14_R, 180, 90)
            Line((0, FILLET14_R), (0, 0))
            Line((0, 0), (FILLET14_R, 0))
        make_face()
    extrude(amount=35.5, mode=Mode.SUBTRACT)


solid = part.part
